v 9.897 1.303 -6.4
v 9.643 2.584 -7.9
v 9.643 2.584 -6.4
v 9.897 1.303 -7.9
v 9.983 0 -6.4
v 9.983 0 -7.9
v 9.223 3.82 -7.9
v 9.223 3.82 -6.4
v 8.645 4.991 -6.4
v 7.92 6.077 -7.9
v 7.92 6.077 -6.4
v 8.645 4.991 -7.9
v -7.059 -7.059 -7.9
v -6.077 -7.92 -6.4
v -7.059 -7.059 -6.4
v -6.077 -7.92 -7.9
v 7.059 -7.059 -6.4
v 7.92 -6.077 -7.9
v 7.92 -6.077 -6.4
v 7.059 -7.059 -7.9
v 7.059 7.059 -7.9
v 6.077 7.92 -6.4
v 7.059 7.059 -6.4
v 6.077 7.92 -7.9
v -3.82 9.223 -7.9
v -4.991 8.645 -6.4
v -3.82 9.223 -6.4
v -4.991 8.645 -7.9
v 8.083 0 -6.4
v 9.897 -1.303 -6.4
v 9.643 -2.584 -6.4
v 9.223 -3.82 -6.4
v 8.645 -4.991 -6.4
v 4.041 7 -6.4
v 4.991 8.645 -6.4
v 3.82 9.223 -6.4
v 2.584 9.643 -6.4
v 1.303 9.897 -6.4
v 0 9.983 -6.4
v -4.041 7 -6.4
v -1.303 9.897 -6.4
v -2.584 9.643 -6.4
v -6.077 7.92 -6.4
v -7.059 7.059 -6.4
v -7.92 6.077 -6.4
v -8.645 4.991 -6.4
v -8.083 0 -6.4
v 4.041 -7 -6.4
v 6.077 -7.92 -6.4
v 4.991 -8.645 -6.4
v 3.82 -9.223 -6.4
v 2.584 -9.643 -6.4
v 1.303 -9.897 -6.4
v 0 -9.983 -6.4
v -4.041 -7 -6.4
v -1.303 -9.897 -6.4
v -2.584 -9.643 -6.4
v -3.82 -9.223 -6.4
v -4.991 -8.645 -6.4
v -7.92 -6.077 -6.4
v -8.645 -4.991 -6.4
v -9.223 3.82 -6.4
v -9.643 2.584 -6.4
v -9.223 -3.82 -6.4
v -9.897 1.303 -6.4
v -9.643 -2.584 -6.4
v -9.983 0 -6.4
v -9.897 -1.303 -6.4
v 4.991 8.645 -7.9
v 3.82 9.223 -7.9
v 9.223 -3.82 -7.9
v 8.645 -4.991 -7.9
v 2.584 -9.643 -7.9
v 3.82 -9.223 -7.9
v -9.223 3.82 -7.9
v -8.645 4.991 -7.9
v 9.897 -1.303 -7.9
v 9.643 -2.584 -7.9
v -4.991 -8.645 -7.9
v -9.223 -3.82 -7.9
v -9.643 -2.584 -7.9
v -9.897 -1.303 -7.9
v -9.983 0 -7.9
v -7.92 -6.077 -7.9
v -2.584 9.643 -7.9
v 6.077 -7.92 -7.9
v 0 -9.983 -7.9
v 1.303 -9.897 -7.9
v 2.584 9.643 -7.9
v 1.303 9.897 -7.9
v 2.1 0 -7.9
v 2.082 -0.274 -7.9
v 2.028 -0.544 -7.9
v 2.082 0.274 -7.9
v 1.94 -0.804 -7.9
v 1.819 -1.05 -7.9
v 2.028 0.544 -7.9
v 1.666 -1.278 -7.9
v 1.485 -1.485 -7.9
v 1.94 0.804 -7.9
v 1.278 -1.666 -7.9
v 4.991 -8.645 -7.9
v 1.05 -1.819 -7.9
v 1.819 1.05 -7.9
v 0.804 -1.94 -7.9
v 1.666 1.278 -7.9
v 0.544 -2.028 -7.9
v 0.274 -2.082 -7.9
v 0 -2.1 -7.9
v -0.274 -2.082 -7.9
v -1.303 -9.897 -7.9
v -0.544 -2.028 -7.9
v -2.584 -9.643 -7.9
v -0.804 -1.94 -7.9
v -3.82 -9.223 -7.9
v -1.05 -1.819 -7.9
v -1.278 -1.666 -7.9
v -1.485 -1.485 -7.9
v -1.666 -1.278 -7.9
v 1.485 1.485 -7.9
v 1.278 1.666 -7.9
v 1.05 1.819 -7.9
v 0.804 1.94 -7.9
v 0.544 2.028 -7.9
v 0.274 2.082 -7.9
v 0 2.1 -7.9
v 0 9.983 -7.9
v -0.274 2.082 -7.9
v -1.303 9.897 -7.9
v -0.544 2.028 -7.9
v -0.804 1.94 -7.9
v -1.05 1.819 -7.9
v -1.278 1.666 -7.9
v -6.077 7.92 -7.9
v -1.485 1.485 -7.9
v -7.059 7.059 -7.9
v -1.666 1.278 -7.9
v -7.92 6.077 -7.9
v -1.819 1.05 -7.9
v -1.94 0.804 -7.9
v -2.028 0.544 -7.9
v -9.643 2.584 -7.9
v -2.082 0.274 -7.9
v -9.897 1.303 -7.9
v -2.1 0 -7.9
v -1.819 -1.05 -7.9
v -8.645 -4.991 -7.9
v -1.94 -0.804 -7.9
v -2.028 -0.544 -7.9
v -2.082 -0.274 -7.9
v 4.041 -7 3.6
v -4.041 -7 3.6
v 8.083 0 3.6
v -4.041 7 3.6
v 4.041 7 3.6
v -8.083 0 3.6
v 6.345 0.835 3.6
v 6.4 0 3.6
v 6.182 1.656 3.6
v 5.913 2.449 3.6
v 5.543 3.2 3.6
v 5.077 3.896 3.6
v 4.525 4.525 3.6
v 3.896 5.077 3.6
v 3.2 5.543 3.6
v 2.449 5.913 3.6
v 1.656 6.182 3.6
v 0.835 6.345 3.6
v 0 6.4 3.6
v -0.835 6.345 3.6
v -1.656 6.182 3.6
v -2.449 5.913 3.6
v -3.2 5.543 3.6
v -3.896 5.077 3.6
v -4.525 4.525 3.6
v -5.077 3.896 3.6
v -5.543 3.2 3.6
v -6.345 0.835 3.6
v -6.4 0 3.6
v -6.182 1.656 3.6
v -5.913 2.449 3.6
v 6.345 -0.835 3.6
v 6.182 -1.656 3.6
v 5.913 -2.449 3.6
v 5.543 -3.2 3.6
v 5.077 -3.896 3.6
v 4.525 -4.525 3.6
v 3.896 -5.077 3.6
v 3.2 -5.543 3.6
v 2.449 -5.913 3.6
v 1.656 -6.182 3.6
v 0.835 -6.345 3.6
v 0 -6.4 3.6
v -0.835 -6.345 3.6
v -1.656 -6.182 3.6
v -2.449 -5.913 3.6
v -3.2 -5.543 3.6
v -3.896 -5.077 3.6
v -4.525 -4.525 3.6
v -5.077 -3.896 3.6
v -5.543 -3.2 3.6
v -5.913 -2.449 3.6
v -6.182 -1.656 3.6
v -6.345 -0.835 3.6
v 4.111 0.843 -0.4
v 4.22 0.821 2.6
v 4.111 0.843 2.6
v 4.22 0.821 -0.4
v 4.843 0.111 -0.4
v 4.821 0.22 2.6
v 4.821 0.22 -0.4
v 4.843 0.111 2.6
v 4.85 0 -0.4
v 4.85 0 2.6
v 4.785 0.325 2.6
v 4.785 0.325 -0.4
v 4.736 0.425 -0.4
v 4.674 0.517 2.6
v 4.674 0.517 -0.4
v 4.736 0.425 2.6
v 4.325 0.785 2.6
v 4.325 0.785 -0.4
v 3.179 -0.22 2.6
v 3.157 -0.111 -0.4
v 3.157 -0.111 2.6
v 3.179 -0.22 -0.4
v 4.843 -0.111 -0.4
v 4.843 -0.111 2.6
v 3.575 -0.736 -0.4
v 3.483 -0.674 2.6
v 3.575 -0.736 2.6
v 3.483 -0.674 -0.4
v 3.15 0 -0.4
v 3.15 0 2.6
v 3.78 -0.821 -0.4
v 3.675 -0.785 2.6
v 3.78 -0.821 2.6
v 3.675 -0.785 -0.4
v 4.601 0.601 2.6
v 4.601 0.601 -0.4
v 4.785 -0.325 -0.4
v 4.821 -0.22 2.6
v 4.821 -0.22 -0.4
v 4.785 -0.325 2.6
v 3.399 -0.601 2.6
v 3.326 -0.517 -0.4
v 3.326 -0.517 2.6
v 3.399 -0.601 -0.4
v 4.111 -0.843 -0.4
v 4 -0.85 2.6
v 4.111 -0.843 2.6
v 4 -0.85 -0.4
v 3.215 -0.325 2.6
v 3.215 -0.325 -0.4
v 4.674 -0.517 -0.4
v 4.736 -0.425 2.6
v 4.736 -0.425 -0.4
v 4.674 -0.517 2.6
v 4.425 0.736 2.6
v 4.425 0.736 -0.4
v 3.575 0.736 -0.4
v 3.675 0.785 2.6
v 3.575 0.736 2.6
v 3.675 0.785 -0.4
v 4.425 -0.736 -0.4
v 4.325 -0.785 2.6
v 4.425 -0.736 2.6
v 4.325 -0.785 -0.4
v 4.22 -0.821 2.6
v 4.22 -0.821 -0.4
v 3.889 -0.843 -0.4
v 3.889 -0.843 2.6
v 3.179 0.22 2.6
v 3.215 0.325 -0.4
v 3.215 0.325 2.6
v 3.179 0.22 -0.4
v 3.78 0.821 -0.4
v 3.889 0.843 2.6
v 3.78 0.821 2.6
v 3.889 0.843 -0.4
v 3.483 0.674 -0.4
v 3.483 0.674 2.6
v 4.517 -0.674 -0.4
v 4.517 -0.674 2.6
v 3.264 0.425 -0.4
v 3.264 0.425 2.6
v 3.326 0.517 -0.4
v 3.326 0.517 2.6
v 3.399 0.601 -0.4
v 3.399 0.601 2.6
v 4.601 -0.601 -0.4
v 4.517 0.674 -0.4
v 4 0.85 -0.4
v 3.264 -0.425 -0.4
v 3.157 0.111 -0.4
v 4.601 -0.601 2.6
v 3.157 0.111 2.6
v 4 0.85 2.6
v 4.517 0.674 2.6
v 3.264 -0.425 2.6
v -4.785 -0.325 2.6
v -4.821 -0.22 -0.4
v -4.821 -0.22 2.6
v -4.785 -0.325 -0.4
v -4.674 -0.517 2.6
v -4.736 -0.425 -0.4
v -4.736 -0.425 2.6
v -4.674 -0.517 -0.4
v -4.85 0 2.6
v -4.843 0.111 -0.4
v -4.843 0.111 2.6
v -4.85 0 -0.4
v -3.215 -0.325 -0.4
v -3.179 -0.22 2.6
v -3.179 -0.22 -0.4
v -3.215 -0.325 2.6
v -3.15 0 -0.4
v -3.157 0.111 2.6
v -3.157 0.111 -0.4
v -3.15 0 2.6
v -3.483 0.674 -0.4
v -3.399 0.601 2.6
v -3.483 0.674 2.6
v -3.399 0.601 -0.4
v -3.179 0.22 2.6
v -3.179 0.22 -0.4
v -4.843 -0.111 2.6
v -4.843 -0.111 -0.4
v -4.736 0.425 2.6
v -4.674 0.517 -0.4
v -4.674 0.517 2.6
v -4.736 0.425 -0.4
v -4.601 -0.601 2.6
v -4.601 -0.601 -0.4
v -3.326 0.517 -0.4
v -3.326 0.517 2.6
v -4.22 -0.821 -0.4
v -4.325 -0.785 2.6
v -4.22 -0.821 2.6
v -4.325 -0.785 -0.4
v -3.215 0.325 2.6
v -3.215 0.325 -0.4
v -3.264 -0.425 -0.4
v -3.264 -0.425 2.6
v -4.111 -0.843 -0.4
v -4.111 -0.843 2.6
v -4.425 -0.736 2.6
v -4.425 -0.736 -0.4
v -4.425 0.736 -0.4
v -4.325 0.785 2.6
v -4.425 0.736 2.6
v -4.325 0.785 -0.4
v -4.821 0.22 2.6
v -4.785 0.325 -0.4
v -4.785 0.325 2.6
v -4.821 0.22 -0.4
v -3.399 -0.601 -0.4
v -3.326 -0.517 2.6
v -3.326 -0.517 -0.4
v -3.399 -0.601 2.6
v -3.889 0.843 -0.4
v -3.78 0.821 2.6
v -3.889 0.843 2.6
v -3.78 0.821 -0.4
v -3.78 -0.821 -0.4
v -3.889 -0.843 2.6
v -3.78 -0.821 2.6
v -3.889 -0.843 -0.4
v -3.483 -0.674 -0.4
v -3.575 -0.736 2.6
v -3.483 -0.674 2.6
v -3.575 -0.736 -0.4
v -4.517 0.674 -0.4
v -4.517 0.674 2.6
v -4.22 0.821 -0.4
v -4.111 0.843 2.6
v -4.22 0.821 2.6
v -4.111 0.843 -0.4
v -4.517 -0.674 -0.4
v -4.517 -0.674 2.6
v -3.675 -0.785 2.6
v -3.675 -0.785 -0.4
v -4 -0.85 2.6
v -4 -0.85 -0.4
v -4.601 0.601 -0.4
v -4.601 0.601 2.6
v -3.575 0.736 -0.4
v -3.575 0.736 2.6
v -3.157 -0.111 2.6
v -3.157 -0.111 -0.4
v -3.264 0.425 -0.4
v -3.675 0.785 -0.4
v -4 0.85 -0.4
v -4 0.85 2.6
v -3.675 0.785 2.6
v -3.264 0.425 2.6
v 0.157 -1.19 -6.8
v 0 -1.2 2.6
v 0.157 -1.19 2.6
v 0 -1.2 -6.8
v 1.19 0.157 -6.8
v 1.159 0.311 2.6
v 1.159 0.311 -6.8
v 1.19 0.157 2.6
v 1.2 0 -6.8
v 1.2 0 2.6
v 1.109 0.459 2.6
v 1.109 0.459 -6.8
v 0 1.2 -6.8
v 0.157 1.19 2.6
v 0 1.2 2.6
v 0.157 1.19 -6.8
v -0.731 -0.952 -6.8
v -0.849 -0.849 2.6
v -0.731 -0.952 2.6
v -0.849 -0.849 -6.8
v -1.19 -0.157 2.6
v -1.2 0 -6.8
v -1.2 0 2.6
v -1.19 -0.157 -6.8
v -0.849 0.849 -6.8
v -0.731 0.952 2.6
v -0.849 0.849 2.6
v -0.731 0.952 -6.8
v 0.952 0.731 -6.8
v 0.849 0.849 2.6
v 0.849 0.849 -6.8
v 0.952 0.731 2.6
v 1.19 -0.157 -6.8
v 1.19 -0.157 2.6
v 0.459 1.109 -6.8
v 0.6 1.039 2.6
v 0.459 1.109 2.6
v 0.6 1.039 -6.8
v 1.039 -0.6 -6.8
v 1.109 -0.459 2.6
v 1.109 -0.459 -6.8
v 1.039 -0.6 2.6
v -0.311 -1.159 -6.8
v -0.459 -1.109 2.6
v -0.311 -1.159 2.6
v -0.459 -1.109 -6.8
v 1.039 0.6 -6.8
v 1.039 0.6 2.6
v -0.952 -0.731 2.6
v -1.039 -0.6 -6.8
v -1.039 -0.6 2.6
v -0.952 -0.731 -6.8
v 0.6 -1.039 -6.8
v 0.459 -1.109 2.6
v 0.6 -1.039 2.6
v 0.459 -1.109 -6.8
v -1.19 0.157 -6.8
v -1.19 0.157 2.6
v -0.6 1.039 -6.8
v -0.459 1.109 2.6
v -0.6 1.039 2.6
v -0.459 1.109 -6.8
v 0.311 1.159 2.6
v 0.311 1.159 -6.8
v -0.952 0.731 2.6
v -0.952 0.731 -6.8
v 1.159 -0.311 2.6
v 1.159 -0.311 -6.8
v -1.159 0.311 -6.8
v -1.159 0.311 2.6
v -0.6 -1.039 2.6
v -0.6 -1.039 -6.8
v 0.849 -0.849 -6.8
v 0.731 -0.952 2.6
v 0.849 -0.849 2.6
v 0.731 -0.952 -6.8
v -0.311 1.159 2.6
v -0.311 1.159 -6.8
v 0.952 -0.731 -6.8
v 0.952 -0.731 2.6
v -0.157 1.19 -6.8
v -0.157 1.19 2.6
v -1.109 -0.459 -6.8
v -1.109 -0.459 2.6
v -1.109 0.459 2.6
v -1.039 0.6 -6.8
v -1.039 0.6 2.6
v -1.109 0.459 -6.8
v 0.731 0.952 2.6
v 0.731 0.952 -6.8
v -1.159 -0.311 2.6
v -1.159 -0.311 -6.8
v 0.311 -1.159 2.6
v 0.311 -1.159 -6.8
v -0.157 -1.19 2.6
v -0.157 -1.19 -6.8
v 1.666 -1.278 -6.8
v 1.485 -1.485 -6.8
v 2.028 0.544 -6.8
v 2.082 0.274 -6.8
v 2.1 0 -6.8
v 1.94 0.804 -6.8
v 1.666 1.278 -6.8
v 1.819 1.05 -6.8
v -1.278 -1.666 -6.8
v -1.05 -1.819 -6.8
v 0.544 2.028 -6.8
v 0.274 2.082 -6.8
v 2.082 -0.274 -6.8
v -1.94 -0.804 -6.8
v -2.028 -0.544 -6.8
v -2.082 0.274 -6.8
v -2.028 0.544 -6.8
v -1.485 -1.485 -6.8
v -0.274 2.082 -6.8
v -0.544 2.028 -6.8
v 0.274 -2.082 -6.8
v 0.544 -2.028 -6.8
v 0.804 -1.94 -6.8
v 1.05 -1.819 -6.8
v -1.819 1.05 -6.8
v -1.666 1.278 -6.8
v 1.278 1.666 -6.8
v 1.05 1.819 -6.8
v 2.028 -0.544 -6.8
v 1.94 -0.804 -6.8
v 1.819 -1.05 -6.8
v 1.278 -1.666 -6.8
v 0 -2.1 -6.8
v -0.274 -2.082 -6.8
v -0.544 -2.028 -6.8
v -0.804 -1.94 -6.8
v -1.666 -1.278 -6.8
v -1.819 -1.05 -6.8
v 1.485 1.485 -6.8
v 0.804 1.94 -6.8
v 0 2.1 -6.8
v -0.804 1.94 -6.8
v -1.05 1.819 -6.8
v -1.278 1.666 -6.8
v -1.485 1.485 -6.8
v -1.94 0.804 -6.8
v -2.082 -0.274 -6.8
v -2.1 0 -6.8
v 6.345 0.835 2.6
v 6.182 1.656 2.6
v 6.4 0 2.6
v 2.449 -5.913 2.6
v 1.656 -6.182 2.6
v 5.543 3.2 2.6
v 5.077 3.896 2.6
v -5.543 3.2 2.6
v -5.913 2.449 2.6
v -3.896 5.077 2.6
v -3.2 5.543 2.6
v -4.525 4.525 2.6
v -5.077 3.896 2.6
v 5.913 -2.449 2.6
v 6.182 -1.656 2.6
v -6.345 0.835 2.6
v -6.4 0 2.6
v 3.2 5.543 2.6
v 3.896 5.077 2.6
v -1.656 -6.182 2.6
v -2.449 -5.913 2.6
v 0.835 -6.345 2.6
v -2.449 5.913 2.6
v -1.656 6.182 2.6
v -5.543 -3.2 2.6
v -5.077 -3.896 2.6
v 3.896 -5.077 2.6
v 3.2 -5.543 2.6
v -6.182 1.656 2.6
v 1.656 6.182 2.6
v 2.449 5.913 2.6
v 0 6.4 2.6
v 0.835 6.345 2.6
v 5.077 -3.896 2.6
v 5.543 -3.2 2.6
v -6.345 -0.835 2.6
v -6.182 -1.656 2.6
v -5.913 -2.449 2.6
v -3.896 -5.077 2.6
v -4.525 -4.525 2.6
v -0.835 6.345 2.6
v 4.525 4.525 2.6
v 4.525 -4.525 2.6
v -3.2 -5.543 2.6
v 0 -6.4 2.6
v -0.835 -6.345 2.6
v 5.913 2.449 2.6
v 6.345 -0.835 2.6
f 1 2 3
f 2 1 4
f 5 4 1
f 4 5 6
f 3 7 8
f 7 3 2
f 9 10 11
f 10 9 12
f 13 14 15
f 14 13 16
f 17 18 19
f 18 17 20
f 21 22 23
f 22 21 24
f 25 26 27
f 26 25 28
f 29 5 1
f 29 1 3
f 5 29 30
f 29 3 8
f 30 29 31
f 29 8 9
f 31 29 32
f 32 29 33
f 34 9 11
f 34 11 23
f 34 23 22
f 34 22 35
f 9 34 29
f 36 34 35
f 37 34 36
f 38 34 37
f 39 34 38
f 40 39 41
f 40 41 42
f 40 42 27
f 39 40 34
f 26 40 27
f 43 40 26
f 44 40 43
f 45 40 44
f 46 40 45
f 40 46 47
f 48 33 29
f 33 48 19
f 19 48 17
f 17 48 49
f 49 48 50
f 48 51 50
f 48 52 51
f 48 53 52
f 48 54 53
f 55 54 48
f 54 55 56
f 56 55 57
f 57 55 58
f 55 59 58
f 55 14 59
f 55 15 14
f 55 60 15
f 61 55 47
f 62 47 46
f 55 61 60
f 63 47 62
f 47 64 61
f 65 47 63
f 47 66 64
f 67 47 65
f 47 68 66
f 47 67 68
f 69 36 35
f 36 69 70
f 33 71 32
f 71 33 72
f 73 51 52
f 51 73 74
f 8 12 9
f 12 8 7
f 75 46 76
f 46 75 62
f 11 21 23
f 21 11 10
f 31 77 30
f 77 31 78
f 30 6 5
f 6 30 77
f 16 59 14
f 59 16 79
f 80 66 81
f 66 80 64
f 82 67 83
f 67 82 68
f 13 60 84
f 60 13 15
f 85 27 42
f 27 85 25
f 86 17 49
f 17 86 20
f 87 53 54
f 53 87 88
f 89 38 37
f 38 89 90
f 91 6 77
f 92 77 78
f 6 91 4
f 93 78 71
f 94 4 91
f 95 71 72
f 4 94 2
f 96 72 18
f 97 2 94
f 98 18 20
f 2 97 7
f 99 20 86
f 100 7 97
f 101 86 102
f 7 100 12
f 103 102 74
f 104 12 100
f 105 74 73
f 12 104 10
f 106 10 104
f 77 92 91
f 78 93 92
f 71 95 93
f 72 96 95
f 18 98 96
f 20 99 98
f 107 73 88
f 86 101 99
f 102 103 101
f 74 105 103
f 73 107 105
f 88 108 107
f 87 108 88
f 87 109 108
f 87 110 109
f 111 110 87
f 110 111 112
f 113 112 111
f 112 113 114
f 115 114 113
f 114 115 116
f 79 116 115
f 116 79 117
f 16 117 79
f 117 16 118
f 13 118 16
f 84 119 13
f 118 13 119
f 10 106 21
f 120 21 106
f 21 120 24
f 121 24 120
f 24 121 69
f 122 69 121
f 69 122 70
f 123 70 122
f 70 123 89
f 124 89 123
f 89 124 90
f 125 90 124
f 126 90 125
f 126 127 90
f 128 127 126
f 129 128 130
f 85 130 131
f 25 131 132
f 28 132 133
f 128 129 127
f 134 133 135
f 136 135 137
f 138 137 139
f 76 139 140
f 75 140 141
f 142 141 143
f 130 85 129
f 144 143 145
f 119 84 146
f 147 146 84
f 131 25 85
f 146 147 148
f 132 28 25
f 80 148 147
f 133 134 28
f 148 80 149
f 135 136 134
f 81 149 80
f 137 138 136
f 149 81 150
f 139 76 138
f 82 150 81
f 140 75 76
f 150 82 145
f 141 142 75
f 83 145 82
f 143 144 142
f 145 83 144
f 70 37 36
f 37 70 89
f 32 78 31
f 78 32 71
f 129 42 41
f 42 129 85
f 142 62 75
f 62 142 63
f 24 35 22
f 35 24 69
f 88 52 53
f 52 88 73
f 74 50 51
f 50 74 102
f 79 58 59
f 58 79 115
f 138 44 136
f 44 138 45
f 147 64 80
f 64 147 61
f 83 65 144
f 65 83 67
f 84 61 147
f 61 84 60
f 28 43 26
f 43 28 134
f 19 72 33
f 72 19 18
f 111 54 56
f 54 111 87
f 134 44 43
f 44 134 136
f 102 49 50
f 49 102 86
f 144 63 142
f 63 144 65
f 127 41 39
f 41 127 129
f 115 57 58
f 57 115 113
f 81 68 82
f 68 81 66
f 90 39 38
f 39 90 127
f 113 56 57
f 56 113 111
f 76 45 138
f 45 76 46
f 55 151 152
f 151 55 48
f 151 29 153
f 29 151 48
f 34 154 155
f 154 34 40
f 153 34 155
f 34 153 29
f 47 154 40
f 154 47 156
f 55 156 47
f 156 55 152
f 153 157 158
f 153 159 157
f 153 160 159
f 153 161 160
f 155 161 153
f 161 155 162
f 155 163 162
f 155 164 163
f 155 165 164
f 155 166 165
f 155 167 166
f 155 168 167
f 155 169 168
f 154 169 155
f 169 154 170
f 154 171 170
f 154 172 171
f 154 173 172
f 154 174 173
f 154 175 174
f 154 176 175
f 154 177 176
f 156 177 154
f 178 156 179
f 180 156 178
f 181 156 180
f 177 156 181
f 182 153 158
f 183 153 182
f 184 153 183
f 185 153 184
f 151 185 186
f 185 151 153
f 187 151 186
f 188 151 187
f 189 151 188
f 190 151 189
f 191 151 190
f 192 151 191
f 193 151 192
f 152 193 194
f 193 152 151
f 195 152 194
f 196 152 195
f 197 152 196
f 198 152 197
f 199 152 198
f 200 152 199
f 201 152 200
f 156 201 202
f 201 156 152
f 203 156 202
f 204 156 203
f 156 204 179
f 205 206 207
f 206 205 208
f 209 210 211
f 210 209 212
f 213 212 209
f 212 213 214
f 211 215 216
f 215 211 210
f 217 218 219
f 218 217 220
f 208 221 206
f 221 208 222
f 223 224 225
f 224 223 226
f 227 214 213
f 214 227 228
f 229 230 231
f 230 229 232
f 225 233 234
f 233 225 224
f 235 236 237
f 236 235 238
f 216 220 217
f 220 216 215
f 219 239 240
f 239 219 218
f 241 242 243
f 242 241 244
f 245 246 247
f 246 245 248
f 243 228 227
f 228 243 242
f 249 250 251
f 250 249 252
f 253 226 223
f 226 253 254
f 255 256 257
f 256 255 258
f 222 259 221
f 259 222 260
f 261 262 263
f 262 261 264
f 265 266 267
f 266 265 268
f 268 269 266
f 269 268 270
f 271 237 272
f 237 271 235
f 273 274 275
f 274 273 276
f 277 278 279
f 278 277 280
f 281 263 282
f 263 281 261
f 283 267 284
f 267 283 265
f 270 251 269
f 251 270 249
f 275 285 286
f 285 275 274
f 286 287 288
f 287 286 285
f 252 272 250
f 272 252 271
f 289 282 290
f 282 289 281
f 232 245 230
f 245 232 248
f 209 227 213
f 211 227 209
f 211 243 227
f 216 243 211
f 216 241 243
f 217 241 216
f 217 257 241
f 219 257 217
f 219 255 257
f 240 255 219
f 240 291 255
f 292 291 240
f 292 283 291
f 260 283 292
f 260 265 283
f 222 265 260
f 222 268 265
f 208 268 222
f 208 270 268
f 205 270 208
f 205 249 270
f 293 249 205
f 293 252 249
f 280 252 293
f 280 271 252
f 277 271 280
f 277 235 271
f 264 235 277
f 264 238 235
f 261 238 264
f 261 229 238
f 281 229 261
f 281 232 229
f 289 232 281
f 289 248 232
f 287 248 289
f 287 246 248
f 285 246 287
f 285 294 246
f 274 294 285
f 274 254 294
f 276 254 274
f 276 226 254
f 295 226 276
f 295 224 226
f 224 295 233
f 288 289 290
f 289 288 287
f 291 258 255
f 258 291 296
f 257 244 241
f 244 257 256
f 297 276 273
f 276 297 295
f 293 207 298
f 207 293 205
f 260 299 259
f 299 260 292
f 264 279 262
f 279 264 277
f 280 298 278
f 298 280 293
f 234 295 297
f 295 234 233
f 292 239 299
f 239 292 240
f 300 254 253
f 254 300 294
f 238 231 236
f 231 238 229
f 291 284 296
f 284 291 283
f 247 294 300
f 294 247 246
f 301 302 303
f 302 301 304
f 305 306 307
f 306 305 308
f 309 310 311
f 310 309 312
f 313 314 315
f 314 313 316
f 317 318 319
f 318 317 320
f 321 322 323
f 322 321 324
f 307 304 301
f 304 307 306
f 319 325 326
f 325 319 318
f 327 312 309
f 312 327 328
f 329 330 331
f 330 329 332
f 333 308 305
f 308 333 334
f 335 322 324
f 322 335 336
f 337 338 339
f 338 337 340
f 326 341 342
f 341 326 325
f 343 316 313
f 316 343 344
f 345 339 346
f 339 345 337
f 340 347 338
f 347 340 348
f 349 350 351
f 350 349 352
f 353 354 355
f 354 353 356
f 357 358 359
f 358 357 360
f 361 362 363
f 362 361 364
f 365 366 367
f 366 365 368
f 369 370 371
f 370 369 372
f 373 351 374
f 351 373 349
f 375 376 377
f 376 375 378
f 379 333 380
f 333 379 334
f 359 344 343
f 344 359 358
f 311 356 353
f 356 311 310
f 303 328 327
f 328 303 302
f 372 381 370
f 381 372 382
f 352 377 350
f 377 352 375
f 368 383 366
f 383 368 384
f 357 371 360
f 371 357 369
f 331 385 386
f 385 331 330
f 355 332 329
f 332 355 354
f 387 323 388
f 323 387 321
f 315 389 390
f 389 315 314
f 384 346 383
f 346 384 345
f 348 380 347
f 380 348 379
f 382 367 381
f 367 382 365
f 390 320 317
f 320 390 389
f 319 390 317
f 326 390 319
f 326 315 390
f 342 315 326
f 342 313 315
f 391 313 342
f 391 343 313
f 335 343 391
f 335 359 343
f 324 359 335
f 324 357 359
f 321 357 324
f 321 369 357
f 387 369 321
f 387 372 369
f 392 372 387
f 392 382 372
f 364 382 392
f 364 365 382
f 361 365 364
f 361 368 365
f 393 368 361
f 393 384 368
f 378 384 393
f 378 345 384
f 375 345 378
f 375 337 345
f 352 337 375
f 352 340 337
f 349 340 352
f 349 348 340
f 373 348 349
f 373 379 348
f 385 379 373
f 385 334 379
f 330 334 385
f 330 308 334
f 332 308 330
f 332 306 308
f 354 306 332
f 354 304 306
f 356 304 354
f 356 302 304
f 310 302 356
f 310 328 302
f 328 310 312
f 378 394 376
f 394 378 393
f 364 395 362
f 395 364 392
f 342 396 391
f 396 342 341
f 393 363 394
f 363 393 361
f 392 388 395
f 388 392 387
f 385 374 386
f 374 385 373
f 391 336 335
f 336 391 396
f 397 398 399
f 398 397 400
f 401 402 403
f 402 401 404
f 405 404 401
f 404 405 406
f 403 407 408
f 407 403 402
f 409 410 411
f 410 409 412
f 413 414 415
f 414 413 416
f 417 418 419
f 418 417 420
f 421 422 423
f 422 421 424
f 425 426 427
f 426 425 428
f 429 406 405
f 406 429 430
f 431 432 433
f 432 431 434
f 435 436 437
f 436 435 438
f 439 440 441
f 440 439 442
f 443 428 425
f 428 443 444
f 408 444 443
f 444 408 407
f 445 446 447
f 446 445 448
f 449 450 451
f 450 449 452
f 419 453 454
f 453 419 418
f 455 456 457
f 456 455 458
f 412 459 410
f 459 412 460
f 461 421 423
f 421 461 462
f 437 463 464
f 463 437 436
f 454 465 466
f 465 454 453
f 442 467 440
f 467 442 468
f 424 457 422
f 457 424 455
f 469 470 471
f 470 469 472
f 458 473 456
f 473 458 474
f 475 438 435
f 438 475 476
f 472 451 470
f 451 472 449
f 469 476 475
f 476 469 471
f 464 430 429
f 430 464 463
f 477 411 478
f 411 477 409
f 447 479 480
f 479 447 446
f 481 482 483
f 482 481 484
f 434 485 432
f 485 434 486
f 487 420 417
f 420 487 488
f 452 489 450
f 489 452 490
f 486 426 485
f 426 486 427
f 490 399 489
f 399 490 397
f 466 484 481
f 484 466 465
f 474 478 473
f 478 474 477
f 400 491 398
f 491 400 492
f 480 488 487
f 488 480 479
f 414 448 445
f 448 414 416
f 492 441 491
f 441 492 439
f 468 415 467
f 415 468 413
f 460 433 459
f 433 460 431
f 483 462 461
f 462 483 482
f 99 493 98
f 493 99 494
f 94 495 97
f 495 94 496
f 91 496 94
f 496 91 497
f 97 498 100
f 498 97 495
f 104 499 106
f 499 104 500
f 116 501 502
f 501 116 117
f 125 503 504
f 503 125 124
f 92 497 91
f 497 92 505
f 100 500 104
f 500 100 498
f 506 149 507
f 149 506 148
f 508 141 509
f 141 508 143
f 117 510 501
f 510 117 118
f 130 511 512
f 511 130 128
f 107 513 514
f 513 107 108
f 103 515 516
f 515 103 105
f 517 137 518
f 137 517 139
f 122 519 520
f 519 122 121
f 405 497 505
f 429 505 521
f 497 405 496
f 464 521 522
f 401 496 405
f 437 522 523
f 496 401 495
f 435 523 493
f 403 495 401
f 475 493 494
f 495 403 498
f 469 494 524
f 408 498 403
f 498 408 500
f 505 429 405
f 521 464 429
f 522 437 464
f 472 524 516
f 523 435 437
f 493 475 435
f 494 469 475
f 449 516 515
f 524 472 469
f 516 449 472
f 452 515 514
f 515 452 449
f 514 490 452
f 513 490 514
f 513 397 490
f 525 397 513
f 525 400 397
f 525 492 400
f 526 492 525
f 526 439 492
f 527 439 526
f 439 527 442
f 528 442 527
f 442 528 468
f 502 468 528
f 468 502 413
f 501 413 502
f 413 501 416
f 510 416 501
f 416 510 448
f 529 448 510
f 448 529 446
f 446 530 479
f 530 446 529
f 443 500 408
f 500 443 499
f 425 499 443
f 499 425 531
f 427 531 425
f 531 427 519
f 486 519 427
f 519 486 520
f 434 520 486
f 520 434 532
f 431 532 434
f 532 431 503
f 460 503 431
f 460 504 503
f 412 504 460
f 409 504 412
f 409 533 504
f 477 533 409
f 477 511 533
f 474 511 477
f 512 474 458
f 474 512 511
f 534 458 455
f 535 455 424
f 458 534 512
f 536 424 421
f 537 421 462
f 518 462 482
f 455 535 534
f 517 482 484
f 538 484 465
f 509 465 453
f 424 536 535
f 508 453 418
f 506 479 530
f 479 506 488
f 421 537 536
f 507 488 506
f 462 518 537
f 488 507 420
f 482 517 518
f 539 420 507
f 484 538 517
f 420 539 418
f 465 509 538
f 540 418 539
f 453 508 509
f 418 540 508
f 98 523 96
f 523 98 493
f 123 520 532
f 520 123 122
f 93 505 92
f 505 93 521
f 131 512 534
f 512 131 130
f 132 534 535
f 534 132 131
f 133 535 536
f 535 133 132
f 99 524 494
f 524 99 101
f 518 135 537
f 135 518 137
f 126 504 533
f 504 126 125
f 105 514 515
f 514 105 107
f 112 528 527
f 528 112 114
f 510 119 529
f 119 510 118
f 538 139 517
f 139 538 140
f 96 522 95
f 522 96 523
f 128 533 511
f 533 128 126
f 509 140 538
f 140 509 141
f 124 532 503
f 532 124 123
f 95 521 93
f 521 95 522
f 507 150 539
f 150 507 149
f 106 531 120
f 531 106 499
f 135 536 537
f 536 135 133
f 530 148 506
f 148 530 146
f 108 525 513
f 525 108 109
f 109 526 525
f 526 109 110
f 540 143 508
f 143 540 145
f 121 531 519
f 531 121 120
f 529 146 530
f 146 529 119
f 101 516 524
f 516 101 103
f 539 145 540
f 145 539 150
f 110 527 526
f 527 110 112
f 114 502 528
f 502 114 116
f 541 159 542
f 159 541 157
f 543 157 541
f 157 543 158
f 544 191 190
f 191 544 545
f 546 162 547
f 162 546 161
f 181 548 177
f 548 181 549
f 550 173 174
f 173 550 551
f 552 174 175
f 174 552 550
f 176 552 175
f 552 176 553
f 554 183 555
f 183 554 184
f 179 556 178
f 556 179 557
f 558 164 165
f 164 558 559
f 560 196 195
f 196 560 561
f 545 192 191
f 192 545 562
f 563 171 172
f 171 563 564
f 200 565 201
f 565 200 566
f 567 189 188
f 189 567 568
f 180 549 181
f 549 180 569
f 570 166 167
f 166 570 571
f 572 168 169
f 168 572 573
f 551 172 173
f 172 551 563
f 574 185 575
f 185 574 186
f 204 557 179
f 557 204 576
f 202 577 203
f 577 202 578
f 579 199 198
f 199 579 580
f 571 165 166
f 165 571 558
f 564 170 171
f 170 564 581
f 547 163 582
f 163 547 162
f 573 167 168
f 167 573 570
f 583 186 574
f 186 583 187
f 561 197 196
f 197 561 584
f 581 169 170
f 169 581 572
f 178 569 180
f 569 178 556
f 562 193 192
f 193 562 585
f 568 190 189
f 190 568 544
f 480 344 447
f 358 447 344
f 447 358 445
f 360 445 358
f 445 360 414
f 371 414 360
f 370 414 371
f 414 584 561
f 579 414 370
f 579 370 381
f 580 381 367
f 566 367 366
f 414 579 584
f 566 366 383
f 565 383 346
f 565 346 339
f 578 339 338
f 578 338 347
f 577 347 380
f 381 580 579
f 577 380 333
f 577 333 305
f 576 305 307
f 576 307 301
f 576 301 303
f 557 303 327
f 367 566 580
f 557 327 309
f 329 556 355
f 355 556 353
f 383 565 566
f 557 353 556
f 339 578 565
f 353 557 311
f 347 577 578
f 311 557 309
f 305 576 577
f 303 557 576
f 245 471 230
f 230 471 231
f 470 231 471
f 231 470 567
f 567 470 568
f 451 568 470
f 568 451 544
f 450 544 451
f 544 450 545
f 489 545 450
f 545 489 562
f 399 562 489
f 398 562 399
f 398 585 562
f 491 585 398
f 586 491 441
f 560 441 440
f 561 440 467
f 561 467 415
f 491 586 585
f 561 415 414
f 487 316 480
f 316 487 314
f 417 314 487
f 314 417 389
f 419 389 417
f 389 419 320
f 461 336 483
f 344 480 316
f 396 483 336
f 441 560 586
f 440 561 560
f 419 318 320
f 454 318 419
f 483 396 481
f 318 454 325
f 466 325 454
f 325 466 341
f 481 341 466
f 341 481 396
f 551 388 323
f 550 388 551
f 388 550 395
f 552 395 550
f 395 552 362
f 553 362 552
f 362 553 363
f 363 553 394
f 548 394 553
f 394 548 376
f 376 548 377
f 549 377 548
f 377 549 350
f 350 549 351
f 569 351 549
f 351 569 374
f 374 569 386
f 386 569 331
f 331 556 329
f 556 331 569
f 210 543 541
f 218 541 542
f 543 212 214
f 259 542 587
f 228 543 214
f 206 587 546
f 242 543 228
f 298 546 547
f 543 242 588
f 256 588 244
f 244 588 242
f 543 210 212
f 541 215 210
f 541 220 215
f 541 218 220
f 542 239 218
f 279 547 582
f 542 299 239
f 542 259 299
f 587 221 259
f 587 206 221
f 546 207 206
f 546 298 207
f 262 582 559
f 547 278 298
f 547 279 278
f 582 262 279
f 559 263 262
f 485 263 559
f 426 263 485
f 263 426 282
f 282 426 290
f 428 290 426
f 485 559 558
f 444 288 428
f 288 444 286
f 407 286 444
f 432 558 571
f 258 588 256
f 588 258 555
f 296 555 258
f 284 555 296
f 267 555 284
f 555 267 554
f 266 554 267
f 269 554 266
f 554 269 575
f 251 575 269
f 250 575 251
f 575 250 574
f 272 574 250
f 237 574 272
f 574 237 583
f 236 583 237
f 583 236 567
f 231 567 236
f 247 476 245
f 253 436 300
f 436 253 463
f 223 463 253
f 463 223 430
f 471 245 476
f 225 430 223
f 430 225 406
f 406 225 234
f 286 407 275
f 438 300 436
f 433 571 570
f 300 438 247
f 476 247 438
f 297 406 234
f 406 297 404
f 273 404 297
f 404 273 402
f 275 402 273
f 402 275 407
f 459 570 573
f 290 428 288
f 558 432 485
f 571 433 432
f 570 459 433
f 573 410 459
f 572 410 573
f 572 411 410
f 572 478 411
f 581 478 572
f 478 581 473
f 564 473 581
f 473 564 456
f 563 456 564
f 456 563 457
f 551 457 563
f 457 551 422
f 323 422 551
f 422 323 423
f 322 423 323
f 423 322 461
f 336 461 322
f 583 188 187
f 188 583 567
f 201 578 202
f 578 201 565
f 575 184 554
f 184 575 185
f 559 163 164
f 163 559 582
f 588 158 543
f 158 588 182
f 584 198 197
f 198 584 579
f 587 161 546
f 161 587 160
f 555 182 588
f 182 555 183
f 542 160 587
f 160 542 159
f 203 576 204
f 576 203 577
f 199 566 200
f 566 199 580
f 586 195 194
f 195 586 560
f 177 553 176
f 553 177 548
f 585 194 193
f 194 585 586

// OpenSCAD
// hub_MG92B_cover: F6 then export STL
include <../lib/g1_servo_arm.scad>
part = "hub_MG92B_cover";
